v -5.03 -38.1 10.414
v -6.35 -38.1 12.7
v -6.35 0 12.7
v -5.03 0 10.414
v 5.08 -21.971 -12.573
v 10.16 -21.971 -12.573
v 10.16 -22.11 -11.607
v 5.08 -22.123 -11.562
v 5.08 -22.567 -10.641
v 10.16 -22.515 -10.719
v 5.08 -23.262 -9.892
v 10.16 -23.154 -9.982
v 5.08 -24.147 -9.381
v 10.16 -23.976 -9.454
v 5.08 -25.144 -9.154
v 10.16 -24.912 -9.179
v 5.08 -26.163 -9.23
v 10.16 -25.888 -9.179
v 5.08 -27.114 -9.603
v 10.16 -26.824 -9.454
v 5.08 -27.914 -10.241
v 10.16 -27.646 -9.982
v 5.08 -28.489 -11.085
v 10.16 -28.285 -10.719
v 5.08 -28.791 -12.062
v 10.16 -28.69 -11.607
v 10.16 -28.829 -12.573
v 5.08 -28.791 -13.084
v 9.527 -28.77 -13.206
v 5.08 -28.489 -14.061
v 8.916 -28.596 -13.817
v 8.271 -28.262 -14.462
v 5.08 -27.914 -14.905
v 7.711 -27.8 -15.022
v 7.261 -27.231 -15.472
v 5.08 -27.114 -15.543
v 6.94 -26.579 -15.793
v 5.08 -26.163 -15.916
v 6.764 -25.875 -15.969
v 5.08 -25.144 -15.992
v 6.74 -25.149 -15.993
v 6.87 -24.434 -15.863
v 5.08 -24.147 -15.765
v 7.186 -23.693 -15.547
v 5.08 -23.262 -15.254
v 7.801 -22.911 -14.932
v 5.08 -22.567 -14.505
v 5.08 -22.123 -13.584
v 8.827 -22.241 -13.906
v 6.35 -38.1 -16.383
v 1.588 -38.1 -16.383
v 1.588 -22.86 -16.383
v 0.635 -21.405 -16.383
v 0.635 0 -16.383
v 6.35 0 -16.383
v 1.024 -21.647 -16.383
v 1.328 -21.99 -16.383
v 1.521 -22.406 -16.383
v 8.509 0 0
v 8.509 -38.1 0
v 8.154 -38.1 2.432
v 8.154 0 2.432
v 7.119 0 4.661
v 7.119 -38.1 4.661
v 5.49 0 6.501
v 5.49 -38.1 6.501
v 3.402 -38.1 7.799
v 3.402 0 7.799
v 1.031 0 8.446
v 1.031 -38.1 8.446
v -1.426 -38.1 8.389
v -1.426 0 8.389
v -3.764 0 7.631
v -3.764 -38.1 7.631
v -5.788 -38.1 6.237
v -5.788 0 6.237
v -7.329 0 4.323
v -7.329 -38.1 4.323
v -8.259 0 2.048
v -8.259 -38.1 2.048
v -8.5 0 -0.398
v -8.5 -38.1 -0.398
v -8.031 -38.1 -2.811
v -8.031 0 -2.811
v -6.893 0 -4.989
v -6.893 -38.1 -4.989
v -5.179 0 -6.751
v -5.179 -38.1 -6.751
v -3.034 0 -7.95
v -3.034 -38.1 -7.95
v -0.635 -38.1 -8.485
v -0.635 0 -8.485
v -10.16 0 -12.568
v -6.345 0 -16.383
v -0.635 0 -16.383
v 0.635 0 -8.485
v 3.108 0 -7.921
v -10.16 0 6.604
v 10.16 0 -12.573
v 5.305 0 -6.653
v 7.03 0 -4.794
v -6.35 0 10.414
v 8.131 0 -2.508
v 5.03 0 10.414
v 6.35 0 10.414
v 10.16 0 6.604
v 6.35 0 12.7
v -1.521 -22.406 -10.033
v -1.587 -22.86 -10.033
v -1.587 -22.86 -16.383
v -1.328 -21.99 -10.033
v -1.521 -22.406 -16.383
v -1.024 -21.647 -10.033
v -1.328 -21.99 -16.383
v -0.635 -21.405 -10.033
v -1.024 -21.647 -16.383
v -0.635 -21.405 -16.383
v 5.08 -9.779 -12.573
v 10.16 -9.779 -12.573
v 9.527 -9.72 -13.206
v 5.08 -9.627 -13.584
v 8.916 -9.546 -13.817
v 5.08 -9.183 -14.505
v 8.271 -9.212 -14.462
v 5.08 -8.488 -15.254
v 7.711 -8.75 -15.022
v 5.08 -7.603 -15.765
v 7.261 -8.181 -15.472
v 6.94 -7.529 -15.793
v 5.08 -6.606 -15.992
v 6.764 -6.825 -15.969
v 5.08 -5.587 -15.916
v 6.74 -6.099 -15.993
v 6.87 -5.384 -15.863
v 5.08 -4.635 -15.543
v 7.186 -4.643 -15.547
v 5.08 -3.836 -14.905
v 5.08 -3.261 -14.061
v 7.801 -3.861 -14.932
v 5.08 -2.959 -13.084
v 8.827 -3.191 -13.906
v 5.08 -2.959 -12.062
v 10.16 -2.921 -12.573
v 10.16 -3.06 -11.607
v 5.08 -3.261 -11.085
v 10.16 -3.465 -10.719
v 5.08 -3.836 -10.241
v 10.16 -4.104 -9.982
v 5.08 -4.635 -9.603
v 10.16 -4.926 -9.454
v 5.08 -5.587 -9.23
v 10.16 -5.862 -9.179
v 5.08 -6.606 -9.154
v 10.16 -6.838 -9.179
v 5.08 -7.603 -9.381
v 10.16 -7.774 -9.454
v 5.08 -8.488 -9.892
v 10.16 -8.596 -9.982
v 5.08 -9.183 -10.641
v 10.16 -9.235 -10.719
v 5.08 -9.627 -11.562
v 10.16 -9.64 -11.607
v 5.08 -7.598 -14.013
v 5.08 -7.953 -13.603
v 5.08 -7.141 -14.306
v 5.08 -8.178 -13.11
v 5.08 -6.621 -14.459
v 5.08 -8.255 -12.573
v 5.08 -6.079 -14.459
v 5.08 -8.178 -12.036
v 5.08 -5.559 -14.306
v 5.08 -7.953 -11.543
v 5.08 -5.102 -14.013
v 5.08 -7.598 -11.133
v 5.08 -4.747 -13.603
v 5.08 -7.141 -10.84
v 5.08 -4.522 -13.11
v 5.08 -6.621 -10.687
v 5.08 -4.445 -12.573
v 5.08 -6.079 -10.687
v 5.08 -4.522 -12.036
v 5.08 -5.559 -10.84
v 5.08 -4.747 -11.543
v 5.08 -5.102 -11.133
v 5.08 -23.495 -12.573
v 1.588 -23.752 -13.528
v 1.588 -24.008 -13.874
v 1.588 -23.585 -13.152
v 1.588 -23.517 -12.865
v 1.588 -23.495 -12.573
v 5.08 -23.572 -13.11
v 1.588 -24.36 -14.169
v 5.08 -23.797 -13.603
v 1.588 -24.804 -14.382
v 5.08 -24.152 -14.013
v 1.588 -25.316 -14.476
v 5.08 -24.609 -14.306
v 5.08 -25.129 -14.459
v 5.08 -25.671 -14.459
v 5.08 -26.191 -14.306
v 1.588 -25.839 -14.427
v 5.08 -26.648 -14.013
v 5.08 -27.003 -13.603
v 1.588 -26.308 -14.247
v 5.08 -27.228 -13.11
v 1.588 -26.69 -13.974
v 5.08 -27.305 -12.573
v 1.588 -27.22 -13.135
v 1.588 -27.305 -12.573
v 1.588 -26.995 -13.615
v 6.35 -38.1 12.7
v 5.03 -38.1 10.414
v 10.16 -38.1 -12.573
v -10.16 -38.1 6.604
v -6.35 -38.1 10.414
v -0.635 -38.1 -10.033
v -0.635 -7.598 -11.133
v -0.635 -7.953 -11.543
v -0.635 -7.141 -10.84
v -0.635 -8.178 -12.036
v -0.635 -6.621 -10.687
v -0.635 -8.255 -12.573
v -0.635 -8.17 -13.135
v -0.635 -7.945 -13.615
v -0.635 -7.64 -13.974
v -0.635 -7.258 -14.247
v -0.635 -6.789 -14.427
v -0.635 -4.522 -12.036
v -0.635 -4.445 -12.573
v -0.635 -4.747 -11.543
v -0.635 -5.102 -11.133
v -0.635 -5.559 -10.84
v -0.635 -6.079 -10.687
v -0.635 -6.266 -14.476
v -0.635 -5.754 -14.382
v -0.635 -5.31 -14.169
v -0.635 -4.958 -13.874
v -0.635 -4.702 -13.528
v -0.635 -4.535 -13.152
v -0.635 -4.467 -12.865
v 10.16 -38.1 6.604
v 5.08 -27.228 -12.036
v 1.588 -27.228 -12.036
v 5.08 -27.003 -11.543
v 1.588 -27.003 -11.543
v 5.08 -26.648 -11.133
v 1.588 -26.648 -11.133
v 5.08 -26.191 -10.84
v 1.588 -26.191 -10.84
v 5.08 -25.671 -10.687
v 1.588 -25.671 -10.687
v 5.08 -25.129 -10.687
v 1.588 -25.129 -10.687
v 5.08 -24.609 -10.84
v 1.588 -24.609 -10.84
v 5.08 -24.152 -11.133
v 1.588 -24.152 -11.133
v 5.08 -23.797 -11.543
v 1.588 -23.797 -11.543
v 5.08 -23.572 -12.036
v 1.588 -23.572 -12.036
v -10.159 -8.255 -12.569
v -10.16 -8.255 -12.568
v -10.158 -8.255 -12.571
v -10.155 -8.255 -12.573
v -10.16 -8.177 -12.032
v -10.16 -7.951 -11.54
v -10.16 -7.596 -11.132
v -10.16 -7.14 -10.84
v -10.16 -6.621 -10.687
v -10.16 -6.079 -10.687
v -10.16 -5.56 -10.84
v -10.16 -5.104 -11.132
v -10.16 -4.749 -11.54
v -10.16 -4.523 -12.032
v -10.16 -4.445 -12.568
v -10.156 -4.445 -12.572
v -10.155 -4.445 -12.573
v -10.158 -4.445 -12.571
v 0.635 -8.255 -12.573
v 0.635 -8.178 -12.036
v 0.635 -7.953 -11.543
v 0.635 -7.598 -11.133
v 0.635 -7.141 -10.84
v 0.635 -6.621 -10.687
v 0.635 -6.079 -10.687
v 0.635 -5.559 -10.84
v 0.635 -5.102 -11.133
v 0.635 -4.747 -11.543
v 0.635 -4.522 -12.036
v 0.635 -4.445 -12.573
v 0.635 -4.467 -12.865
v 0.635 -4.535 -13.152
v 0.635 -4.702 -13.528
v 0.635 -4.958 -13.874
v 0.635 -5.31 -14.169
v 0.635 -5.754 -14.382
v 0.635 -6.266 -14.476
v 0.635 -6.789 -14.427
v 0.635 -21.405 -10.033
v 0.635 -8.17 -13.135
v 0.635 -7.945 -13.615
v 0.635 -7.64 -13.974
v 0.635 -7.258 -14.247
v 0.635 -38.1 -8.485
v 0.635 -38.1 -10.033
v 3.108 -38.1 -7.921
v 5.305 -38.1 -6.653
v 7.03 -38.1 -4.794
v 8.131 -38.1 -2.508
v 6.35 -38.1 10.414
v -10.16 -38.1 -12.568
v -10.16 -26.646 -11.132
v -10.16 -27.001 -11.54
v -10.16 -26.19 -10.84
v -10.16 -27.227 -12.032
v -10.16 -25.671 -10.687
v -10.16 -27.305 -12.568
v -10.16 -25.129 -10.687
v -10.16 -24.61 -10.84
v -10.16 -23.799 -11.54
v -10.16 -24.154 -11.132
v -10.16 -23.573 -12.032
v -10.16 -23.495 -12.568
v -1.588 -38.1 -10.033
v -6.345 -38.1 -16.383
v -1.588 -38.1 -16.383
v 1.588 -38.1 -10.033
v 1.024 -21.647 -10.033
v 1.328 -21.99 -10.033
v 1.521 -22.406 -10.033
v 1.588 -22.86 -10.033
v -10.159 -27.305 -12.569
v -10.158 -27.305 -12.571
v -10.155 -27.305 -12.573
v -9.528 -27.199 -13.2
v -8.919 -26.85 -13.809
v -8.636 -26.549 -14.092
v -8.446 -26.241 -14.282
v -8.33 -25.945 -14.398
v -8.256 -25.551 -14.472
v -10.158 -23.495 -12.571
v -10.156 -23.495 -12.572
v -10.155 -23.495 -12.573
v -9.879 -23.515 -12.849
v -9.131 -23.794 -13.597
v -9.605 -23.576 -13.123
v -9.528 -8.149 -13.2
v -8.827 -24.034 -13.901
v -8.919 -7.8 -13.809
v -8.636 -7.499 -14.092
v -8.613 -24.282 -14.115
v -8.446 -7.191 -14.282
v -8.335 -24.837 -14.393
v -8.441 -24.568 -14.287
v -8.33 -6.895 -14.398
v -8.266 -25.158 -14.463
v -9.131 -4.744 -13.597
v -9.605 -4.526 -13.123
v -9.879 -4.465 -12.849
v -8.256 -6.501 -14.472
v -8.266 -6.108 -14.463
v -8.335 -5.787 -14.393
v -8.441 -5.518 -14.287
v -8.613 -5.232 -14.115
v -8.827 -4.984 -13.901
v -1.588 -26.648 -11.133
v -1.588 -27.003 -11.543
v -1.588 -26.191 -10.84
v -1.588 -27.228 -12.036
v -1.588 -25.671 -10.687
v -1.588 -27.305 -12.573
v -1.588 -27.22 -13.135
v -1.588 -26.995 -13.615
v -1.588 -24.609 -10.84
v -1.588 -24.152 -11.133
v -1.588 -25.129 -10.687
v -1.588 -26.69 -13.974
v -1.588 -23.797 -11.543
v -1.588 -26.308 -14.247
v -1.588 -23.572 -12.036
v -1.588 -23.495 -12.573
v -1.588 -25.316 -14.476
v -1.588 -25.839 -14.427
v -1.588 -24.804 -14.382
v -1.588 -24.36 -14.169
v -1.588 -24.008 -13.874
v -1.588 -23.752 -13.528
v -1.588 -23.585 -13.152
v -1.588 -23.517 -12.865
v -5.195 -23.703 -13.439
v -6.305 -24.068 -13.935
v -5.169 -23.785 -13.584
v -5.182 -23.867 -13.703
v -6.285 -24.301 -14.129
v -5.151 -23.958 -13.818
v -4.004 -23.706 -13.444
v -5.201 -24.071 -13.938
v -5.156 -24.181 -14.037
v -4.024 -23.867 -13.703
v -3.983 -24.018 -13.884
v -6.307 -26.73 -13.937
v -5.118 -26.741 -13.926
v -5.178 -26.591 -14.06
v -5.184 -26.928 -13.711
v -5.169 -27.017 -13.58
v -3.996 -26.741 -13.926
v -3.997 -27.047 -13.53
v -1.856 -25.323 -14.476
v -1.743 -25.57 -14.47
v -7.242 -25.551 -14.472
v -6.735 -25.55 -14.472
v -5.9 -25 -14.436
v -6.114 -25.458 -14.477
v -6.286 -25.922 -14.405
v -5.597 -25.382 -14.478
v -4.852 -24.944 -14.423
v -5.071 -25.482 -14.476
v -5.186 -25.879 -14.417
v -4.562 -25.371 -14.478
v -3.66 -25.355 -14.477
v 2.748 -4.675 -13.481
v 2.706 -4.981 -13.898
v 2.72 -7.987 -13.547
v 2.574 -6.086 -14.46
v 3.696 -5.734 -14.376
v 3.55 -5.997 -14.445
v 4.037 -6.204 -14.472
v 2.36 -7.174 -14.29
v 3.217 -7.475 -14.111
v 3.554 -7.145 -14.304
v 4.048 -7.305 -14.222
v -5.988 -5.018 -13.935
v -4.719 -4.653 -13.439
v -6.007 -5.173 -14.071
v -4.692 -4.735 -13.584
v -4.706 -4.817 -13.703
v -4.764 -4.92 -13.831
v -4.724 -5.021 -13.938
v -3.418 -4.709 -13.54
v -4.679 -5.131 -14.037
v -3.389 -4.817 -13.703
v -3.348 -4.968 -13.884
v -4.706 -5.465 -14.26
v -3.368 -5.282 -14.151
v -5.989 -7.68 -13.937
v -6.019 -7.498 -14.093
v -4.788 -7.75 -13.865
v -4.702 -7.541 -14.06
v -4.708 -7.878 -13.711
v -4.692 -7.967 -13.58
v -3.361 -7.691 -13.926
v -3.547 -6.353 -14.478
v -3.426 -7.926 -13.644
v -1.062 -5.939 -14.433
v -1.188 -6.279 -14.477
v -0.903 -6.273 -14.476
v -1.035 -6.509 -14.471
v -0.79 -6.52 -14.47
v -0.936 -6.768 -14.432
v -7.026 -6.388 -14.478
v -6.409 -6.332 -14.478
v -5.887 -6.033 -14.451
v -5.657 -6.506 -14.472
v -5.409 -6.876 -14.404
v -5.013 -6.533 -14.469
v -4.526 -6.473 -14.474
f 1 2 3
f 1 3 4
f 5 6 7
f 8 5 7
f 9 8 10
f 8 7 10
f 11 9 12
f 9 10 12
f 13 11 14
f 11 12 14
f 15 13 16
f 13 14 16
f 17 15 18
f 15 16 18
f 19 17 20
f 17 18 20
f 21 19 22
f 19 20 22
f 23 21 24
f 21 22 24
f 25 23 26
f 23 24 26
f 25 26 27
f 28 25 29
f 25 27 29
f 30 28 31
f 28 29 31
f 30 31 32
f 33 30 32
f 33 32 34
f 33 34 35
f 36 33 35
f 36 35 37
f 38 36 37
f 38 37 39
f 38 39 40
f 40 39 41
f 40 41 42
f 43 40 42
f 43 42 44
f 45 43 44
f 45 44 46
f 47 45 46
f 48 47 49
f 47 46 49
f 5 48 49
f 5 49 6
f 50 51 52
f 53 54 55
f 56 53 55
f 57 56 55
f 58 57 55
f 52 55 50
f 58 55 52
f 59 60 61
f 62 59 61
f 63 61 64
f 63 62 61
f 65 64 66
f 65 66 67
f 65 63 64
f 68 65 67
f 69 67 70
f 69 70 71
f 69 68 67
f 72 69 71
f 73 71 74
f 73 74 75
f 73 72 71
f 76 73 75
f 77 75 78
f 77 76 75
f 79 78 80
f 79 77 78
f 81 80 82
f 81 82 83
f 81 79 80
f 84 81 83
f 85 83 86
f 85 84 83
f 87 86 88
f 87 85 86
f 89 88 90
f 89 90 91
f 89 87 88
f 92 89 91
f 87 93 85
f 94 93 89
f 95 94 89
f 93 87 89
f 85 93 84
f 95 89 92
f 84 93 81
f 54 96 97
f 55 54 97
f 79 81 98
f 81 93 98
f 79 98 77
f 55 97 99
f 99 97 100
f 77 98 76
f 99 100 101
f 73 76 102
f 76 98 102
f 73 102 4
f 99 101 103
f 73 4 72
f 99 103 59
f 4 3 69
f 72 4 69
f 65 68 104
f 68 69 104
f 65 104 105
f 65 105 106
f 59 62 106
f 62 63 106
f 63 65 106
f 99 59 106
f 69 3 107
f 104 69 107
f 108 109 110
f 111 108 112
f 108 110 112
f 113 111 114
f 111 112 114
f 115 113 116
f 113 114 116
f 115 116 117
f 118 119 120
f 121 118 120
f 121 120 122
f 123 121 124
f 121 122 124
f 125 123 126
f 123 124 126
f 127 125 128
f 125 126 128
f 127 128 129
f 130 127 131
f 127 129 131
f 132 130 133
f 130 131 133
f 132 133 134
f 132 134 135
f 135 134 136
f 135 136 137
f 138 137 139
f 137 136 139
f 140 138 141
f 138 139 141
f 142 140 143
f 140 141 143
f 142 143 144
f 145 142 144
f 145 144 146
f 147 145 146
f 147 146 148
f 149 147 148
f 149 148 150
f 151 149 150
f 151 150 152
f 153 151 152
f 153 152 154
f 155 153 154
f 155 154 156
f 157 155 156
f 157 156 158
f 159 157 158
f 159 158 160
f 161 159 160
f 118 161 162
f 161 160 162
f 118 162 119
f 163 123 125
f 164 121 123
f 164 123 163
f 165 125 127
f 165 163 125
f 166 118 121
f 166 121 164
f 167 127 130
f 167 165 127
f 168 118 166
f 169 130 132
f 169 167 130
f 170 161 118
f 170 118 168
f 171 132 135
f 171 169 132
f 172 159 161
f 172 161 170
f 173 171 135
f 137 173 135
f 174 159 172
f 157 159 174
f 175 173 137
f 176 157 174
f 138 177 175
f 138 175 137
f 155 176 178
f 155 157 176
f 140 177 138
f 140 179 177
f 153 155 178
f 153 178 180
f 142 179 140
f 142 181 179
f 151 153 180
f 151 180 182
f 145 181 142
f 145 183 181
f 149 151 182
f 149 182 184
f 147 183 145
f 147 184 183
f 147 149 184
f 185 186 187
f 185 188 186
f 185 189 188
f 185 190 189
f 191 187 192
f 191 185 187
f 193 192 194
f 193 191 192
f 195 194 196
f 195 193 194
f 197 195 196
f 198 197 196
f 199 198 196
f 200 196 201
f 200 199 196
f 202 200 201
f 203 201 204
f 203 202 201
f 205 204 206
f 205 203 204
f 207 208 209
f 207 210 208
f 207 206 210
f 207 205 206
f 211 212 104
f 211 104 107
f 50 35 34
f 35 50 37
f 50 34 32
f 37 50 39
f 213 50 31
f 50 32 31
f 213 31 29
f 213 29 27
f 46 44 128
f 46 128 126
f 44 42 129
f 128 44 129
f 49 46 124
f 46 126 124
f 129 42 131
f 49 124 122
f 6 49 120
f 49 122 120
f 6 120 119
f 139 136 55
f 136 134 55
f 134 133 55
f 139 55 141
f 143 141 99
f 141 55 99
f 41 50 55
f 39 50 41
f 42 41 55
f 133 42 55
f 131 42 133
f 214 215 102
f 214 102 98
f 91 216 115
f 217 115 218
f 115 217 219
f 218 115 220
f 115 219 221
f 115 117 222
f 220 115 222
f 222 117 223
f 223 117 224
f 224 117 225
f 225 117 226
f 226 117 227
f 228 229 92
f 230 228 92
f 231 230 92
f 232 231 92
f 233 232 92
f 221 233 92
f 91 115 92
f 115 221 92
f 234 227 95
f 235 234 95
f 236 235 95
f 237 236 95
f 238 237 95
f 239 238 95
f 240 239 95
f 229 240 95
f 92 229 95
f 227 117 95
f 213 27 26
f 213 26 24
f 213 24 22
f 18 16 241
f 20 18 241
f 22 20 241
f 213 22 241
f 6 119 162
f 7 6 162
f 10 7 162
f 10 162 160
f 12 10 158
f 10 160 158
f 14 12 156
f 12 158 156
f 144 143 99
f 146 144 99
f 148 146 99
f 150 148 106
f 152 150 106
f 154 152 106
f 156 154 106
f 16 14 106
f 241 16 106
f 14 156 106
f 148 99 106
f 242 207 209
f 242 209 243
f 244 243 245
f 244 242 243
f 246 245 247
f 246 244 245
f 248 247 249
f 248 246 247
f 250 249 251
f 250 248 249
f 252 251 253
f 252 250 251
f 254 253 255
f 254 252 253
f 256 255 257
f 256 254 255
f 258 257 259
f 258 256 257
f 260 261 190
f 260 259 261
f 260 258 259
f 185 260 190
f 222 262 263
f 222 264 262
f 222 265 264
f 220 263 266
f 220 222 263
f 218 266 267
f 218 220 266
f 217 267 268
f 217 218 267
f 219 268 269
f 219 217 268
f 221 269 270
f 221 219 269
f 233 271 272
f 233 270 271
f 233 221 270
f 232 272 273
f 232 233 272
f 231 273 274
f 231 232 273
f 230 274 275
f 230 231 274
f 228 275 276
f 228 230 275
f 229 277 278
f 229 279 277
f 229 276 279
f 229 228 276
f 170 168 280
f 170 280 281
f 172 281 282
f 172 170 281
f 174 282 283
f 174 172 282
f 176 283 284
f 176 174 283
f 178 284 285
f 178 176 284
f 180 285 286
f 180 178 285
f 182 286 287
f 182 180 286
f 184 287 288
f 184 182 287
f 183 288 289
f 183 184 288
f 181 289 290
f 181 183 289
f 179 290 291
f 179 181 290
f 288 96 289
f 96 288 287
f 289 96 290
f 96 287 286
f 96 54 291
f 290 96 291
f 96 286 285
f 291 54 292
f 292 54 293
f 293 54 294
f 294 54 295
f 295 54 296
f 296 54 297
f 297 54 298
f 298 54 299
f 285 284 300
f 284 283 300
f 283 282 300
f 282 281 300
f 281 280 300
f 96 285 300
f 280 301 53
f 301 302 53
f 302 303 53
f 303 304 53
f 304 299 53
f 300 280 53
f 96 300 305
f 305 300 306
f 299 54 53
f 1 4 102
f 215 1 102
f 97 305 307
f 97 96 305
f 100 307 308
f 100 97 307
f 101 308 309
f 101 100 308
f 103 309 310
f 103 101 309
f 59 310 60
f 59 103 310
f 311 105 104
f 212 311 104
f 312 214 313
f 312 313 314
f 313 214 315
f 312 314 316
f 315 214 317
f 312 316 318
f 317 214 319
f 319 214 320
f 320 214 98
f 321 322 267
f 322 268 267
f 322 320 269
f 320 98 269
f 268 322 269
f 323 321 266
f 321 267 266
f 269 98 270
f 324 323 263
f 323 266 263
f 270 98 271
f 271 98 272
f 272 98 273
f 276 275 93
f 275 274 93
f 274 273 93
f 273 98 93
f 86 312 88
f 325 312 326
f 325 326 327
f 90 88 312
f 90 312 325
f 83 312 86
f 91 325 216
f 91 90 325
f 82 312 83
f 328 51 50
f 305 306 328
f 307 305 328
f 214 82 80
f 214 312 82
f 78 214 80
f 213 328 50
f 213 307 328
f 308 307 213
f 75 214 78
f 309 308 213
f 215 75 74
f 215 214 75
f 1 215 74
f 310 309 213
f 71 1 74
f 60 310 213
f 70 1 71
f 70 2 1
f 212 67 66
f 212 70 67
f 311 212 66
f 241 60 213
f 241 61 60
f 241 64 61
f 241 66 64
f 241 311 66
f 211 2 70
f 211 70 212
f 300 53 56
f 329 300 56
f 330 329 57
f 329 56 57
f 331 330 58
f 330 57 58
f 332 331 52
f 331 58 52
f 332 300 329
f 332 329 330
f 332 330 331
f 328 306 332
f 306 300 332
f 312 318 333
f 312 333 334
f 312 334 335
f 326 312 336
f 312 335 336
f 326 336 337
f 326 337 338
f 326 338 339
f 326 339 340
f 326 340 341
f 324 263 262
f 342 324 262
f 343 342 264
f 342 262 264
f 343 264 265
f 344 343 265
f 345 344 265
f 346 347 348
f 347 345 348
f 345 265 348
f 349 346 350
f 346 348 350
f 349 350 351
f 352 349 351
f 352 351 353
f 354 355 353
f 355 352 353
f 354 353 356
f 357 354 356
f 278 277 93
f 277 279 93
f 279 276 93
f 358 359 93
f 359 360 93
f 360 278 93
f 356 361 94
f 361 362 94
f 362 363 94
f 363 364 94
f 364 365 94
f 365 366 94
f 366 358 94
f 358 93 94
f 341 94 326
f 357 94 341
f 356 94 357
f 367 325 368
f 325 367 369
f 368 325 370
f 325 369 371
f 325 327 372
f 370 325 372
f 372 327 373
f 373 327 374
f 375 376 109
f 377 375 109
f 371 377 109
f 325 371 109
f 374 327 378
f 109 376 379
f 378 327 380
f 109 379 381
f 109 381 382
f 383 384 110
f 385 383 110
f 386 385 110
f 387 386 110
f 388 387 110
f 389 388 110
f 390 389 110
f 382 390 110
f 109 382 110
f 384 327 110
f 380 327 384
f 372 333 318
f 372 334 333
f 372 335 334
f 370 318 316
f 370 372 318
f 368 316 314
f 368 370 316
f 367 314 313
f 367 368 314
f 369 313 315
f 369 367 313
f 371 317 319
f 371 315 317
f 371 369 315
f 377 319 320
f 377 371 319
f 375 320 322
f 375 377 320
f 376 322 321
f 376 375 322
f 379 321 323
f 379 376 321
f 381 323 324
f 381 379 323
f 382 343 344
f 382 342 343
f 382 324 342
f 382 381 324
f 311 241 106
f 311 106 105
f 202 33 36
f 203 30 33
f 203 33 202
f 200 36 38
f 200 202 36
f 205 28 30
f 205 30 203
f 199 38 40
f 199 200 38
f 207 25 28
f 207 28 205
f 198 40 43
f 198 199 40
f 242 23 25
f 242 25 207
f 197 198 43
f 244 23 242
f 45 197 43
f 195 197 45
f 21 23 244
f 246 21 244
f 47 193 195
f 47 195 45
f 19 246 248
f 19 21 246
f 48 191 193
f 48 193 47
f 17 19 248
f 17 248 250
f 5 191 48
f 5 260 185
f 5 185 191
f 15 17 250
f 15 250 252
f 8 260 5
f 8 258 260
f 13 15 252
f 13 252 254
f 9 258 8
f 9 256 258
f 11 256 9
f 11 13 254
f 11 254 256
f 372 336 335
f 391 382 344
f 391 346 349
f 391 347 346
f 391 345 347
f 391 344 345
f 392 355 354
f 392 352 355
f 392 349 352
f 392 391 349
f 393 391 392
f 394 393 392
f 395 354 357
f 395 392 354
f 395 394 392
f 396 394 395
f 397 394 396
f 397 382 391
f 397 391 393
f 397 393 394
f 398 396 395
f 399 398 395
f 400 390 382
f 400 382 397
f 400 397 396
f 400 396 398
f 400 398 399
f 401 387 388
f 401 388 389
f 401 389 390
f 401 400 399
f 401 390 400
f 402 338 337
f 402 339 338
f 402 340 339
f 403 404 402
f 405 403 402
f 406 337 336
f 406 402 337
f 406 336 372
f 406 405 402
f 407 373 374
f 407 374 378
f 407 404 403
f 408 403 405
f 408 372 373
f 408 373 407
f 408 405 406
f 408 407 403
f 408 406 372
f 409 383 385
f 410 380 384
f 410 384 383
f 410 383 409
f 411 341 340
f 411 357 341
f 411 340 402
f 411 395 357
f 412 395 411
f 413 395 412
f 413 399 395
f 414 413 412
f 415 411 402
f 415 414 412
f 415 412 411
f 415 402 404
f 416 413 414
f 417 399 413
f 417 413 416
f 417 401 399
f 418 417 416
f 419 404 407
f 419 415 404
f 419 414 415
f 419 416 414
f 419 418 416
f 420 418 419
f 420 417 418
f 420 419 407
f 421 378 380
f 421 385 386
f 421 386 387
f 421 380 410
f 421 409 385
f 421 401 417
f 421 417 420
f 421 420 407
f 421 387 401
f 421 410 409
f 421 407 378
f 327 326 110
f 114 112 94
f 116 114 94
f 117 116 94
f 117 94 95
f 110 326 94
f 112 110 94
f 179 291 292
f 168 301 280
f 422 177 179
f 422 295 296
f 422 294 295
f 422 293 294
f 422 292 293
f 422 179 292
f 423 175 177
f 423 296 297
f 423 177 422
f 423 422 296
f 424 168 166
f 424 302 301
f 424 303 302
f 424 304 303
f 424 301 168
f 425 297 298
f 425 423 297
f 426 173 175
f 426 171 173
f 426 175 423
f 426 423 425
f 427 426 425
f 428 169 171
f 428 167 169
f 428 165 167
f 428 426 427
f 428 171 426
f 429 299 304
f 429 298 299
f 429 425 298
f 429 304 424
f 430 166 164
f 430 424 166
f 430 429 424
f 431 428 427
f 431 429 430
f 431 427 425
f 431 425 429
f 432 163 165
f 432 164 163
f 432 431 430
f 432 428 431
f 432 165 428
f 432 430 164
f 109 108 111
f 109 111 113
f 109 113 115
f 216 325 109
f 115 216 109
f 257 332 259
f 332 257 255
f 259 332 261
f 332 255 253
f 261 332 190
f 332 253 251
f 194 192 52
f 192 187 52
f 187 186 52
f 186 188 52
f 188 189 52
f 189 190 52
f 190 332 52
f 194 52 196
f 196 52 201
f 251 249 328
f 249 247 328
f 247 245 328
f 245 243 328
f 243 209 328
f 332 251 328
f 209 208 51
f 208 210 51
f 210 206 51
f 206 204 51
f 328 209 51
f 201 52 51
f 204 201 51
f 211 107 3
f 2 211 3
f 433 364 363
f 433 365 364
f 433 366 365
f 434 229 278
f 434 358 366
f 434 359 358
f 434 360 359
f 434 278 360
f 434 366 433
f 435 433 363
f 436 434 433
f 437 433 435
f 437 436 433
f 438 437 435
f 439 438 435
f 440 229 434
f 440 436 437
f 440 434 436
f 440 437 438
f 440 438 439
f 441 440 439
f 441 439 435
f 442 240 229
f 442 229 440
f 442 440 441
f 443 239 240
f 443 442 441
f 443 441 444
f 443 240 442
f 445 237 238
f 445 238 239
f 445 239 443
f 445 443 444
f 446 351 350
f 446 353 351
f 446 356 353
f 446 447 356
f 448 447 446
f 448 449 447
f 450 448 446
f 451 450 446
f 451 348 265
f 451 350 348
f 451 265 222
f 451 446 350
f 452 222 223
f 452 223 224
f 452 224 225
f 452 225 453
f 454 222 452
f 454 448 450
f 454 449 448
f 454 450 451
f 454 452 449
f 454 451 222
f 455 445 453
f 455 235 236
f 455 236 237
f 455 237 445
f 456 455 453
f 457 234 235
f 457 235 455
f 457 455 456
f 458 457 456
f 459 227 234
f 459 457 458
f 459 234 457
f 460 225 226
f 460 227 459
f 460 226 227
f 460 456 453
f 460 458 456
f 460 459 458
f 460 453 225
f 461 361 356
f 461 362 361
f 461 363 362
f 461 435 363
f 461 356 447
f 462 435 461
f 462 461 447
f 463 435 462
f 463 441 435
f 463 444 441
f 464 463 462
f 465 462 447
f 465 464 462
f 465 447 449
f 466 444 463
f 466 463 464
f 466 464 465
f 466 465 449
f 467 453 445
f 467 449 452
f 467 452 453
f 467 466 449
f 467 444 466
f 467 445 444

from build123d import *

# Parameters (mm, degrees)
F0_R     = 8.509
F1_DEPTH = 38.1
F3_DEPTH = 6.35
F5_DEPTH = 5.08
F6_DEPTH = 20.321
F8_DEPTH = 8.897727111


# Not quite as in the source:
# - a feature names something its author has since deleted; it is built from what else it names


with BuildPart() as f1:
    # F0 (on Front) → F1 (new body)
    with BuildSketch(Plane.XZ):
        Polygon((5.0301772846, 10.414), (-5.0301772846, 10.414), (-6.35, 10.414), (-10.16, 6.604), (-10.16, -12.5681449387), (-6.3451449387, -16.383), (6.35, -16.383), (10.16, -12.573), (10.16, 6.604), (6.35, 10.414), align=None)
        Circle(F0_R, mode=Mode.SUBTRACT)
        Polygon((6.35, 12.7), (-6.35, 12.7), (-5.0301772846, 10.414), (5.0301772846, 10.414), align=None)
    extrude(amount=F1_DEPTH)

    # F2 (on face) → F3 (cut)
    with BuildSketch(Plane(origin=(0, 0, -16.383), x_dir=(1, 0, 0), z_dir=(0, 0, -1))):
        with BuildLine():
            Line((1.5875, 38.1), (-1.5875, 38.1))
            Line((-1.5875, 38.1), (-1.5875, 22.86))
            ThreePointArc((-1.5875, 22.86), (0, 21.2725), (1.5875, 22.86))
            Line((1.5875, 22.86), (1.5875, 38.1))
        make_face()
    extrude(amount=-F3_DEPTH, mode=Mode.SUBTRACT)

    # F4 (on face) → F5 (cut)
    with BuildSketch(Plane.YZ.offset(10.16)):
        with BuildLine():
            ThreePointArc((-28.829, -12.573), (-25.4, -16.002), (-21.971, -12.573))
            Line((-21.971, -12.573), (-23.495, -12.573))
            ThreePointArc((-23.495, -12.573), (-25.4, -14.478), (-27.305, -12.573))
            Line((-27.305, -12.573), (-28.829, -12.573))
        make_face()
        with BuildLine():
            ThreePointArc((-2.921, -12.573), (-6.35, -9.144), (-9.779, -12.573))
            Line((-9.779, -12.573), (-8.255, -12.573))
            ThreePointArc((-8.255, -12.573), (-6.35, -10.668), (-4.445, -12.573))
            Line((-4.445, -12.573), (-2.921, -12.573))
        make_face()
        with BuildLine():
            Line((-8.255, -12.573), (-9.779, -12.573))
            ThreePointArc((-9.779, -12.573), (-6.35, -16.002), (-2.921, -12.573))
            Line((-2.921, -12.573), (-4.445, -12.573))
            ThreePointArc((-4.445, -12.573), (-6.35, -14.478), (-8.255, -12.573))
        make_face()
        with BuildLine():
            Line((-23.495, -12.573), (-21.971, -12.573))
            ThreePointArc((-21.971, -12.573), (-25.4, -9.144), (-28.829, -12.573))
            Line((-28.829, -12.573), (-27.305, -12.573))
            ThreePointArc((-27.305, -12.573), (-25.4, -10.668), (-23.495, -12.573))
        make_face()
    extrude(amount=-F5_DEPTH, mode=Mode.SUBTRACT)

    # F6 (cut, through all): faces of the model
    f6_faces = [f1.faces().sort_by_distance(p)[0] for p in [
        (10.16, -25.4, -11.7644928891),
        (9.3514928891, -25.4, -13.3815071109),
        (10.16, -6.35, -11.7644928891),
        (9.3514928891, -6.35, -13.3815071109),
    ]]
    extrude(f6_faces, amount=-F6_DEPTH, dir=(1, 0, 0), mode=Mode.SUBTRACT)

    # F7 (on face) → F8 (cut, up to face)
    with BuildSketch(Plane(origin=(0, 0, -16.383), x_dir=(1, 0, 0), z_dir=(0, 0, -1))):
        with BuildLine():
            Line((-0.635, 0), (0.635, 0))
            Line((0.635, 0), (0.635, 21.4050322169))
            ThreePointArc((0.635, 21.4050322169), (0, 21.2725), (-0.635, 21.4050322169))
            Line((-0.635, 21.4050322169), (-0.635, 0))
        make_face()
        with BuildLine():
            ThreePointArc((-0.635, 21.4050322169), (0, 21.2725), (0.635, 21.4050322169))
            Line((0.635, 21.4050322169), (0.635, 38.1))
            Line((0.635, 38.1), (-0.635, 38.1))
            Line((-0.635, 38.1), (-0.635, 21.4050322169))
        make_face()
    extrude(amount=-F8_DEPTH, mode=Mode.SUBTRACT)


solid = f1.part
